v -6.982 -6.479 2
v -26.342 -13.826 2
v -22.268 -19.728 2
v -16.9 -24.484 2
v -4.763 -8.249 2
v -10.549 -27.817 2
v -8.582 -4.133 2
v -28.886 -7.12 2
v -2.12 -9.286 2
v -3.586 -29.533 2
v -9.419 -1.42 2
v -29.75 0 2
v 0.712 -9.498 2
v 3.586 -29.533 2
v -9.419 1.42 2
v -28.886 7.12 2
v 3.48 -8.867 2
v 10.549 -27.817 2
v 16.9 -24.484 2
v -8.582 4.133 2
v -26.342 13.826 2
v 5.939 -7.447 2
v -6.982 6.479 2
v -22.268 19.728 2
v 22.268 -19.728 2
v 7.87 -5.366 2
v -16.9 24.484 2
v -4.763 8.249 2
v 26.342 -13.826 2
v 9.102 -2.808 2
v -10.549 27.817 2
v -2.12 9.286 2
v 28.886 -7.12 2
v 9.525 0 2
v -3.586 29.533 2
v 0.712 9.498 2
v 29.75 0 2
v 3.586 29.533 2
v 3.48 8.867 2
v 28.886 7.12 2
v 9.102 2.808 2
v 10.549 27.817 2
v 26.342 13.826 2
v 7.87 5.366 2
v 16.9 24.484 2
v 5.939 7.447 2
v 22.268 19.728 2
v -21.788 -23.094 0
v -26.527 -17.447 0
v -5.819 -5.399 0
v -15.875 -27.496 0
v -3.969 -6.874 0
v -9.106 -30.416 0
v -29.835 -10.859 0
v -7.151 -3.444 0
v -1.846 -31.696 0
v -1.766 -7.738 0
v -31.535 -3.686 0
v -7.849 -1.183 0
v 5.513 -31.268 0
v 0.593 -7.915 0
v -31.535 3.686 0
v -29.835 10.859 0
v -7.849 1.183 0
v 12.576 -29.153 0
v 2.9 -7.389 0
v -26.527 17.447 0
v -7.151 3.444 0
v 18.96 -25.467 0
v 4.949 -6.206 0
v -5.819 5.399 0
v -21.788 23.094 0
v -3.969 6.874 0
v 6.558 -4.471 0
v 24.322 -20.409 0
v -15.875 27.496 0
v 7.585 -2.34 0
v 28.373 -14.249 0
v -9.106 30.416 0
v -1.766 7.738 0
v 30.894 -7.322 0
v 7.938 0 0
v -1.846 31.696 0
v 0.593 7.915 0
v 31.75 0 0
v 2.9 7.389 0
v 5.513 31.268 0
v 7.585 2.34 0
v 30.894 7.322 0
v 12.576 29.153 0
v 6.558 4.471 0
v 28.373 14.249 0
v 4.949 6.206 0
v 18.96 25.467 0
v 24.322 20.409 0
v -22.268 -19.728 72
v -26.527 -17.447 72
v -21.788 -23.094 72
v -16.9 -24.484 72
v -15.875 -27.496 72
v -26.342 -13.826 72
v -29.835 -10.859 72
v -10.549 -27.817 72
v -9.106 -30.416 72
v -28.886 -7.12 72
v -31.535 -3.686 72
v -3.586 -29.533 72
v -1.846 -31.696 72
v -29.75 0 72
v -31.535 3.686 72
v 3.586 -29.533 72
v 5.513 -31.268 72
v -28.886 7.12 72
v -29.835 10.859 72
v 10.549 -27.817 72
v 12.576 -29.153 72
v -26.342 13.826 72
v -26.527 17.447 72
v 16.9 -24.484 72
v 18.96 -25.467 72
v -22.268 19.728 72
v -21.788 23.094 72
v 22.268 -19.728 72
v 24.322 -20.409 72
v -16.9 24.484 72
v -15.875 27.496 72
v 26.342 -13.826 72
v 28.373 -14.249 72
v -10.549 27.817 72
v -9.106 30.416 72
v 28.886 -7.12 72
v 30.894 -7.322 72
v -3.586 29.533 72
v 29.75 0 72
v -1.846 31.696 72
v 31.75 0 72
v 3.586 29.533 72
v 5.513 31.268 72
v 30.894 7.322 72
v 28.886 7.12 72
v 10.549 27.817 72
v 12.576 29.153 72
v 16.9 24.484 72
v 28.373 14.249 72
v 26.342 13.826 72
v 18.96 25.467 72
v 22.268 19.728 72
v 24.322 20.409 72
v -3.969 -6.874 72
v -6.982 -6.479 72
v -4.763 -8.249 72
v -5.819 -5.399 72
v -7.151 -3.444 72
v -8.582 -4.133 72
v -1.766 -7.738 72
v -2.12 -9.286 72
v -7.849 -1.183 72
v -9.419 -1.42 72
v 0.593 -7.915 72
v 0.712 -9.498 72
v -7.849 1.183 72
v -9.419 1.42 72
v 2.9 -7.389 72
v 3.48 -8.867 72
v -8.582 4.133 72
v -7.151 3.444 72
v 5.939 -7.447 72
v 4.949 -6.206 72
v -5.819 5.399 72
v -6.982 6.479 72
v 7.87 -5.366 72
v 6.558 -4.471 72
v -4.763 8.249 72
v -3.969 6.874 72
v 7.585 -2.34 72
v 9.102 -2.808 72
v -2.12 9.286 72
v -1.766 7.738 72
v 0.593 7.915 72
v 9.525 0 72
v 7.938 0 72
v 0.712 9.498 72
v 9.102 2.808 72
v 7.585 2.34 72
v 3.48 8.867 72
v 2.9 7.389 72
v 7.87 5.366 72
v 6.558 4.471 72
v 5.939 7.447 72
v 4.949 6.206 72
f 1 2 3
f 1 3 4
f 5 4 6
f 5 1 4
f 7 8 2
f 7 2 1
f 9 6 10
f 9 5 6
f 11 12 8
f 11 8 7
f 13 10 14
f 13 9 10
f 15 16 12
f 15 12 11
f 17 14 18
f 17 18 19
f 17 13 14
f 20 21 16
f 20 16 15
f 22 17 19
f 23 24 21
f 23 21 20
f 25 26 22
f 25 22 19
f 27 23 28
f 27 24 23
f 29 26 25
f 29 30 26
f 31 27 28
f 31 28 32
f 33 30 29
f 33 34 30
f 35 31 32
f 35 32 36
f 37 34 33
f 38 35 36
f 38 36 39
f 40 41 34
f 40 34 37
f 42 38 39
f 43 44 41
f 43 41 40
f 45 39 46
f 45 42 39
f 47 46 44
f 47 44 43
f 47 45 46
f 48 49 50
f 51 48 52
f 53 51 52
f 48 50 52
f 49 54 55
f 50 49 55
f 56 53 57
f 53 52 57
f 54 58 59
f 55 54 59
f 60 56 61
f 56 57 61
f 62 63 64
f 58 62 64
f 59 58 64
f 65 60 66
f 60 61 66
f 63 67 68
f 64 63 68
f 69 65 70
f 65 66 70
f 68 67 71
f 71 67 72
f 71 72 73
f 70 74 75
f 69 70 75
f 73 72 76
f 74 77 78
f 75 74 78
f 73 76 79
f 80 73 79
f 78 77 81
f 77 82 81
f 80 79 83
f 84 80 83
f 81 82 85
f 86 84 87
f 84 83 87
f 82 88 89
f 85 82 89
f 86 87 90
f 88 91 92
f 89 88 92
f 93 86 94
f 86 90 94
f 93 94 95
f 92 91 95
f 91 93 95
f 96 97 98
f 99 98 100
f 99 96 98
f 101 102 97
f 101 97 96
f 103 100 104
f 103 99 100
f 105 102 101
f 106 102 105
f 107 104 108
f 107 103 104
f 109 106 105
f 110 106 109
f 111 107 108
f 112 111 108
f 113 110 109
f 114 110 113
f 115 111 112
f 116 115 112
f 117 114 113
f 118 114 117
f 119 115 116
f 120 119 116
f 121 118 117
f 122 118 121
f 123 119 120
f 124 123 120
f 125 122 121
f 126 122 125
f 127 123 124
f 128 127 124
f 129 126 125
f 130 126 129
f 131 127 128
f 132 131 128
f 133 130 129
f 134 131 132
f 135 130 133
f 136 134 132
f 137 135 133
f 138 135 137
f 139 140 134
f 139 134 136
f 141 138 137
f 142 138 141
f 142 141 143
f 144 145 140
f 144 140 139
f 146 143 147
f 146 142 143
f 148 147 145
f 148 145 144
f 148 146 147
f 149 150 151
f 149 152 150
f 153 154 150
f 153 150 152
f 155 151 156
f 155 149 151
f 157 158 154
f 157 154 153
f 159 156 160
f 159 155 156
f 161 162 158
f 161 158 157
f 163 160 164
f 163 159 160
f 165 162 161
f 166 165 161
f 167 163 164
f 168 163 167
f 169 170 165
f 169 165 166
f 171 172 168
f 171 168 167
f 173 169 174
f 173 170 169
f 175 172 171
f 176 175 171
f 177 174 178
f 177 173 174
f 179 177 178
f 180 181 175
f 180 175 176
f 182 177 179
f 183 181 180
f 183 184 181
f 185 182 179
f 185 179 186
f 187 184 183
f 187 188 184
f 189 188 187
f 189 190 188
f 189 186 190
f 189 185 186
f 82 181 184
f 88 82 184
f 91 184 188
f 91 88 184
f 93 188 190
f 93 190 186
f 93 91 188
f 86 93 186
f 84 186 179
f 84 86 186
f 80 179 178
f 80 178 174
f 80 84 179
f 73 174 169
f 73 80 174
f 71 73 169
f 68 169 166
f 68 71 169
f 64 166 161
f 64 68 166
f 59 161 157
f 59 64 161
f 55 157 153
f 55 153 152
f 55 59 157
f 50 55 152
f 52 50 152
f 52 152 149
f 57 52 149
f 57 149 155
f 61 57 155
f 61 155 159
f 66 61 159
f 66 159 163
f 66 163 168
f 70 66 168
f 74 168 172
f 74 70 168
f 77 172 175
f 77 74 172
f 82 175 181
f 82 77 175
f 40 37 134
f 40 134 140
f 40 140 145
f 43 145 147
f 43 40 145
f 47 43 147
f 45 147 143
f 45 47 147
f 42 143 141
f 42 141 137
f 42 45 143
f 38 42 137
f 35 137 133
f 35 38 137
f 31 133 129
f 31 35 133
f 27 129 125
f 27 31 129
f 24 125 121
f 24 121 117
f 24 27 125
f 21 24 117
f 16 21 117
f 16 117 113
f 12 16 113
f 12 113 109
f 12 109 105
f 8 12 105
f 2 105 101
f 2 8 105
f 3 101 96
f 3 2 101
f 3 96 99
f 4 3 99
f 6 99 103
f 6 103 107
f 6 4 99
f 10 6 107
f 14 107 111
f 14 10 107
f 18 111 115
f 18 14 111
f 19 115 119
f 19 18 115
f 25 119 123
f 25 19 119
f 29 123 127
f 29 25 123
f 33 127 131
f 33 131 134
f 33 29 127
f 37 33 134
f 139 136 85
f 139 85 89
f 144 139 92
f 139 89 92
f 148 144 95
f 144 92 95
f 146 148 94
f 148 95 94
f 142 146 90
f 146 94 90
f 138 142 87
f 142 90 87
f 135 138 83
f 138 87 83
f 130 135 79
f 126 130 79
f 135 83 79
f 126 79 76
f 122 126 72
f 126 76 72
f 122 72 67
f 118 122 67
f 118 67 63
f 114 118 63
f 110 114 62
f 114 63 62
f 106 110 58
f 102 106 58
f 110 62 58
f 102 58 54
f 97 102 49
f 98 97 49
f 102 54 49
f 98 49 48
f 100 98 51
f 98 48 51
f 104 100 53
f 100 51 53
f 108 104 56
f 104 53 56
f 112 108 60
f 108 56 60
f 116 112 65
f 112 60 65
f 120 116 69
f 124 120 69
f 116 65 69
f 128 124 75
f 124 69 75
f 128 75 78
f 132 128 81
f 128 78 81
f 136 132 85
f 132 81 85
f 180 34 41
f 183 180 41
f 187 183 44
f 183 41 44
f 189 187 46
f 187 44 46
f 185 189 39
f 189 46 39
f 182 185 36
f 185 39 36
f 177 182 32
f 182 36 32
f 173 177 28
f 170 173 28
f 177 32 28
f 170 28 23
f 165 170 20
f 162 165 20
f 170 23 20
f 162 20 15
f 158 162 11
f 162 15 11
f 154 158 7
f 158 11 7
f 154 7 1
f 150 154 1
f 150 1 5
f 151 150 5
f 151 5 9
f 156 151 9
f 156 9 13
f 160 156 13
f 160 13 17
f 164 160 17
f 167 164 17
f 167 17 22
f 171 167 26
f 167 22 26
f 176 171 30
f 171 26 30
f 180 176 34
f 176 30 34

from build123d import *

# Parameters (mm, degrees)
CROQUIS1_R              = 31.75
CROQUIS1_R_2            = 7.9375
SALIENTE_EXTRUIR1_DEPTH = 2
CROQUIS2_R              = 31.75
CROQUIS2_R_2            = 29.75
SALIENTE_EXTRUIR2_DEPTH = 70
CROQUIS3_R              = 9.525
CROQUIS3_R_2            = 7.9375
SALIENTE_EXTRUIR3_DEPTH = 70


with BuildPart() as part:
    # Croquis1 → Saliente-Extruir1 (new body)
    with BuildSketch(Plane.XY):
        Circle(CROQUIS1_R)
        Circle(CROQUIS1_R_2, mode=Mode.SUBTRACT)
    extrude(amount=SALIENTE_EXTRUIR1_DEPTH)

    # Croquis2 → Saliente-Extruir2 (add)
    with BuildSketch(Plane.XY.offset(2)):
        Circle(CROQUIS2_R)
        Circle(CROQUIS2_R_2, mode=Mode.SUBTRACT)
    extrude(amount=SALIENTE_EXTRUIR2_DEPTH)

    # Croquis3 → Saliente-Extruir3 (add)
    with BuildSketch(Plane.XY.offset(2)):
        Circle(CROQUIS3_R)
        Circle(CROQUIS3_R_2, mode=Mode.SUBTRACT)
    extrude(amount=SALIENTE_EXTRUIR3_DEPTH)


solid = part.part
